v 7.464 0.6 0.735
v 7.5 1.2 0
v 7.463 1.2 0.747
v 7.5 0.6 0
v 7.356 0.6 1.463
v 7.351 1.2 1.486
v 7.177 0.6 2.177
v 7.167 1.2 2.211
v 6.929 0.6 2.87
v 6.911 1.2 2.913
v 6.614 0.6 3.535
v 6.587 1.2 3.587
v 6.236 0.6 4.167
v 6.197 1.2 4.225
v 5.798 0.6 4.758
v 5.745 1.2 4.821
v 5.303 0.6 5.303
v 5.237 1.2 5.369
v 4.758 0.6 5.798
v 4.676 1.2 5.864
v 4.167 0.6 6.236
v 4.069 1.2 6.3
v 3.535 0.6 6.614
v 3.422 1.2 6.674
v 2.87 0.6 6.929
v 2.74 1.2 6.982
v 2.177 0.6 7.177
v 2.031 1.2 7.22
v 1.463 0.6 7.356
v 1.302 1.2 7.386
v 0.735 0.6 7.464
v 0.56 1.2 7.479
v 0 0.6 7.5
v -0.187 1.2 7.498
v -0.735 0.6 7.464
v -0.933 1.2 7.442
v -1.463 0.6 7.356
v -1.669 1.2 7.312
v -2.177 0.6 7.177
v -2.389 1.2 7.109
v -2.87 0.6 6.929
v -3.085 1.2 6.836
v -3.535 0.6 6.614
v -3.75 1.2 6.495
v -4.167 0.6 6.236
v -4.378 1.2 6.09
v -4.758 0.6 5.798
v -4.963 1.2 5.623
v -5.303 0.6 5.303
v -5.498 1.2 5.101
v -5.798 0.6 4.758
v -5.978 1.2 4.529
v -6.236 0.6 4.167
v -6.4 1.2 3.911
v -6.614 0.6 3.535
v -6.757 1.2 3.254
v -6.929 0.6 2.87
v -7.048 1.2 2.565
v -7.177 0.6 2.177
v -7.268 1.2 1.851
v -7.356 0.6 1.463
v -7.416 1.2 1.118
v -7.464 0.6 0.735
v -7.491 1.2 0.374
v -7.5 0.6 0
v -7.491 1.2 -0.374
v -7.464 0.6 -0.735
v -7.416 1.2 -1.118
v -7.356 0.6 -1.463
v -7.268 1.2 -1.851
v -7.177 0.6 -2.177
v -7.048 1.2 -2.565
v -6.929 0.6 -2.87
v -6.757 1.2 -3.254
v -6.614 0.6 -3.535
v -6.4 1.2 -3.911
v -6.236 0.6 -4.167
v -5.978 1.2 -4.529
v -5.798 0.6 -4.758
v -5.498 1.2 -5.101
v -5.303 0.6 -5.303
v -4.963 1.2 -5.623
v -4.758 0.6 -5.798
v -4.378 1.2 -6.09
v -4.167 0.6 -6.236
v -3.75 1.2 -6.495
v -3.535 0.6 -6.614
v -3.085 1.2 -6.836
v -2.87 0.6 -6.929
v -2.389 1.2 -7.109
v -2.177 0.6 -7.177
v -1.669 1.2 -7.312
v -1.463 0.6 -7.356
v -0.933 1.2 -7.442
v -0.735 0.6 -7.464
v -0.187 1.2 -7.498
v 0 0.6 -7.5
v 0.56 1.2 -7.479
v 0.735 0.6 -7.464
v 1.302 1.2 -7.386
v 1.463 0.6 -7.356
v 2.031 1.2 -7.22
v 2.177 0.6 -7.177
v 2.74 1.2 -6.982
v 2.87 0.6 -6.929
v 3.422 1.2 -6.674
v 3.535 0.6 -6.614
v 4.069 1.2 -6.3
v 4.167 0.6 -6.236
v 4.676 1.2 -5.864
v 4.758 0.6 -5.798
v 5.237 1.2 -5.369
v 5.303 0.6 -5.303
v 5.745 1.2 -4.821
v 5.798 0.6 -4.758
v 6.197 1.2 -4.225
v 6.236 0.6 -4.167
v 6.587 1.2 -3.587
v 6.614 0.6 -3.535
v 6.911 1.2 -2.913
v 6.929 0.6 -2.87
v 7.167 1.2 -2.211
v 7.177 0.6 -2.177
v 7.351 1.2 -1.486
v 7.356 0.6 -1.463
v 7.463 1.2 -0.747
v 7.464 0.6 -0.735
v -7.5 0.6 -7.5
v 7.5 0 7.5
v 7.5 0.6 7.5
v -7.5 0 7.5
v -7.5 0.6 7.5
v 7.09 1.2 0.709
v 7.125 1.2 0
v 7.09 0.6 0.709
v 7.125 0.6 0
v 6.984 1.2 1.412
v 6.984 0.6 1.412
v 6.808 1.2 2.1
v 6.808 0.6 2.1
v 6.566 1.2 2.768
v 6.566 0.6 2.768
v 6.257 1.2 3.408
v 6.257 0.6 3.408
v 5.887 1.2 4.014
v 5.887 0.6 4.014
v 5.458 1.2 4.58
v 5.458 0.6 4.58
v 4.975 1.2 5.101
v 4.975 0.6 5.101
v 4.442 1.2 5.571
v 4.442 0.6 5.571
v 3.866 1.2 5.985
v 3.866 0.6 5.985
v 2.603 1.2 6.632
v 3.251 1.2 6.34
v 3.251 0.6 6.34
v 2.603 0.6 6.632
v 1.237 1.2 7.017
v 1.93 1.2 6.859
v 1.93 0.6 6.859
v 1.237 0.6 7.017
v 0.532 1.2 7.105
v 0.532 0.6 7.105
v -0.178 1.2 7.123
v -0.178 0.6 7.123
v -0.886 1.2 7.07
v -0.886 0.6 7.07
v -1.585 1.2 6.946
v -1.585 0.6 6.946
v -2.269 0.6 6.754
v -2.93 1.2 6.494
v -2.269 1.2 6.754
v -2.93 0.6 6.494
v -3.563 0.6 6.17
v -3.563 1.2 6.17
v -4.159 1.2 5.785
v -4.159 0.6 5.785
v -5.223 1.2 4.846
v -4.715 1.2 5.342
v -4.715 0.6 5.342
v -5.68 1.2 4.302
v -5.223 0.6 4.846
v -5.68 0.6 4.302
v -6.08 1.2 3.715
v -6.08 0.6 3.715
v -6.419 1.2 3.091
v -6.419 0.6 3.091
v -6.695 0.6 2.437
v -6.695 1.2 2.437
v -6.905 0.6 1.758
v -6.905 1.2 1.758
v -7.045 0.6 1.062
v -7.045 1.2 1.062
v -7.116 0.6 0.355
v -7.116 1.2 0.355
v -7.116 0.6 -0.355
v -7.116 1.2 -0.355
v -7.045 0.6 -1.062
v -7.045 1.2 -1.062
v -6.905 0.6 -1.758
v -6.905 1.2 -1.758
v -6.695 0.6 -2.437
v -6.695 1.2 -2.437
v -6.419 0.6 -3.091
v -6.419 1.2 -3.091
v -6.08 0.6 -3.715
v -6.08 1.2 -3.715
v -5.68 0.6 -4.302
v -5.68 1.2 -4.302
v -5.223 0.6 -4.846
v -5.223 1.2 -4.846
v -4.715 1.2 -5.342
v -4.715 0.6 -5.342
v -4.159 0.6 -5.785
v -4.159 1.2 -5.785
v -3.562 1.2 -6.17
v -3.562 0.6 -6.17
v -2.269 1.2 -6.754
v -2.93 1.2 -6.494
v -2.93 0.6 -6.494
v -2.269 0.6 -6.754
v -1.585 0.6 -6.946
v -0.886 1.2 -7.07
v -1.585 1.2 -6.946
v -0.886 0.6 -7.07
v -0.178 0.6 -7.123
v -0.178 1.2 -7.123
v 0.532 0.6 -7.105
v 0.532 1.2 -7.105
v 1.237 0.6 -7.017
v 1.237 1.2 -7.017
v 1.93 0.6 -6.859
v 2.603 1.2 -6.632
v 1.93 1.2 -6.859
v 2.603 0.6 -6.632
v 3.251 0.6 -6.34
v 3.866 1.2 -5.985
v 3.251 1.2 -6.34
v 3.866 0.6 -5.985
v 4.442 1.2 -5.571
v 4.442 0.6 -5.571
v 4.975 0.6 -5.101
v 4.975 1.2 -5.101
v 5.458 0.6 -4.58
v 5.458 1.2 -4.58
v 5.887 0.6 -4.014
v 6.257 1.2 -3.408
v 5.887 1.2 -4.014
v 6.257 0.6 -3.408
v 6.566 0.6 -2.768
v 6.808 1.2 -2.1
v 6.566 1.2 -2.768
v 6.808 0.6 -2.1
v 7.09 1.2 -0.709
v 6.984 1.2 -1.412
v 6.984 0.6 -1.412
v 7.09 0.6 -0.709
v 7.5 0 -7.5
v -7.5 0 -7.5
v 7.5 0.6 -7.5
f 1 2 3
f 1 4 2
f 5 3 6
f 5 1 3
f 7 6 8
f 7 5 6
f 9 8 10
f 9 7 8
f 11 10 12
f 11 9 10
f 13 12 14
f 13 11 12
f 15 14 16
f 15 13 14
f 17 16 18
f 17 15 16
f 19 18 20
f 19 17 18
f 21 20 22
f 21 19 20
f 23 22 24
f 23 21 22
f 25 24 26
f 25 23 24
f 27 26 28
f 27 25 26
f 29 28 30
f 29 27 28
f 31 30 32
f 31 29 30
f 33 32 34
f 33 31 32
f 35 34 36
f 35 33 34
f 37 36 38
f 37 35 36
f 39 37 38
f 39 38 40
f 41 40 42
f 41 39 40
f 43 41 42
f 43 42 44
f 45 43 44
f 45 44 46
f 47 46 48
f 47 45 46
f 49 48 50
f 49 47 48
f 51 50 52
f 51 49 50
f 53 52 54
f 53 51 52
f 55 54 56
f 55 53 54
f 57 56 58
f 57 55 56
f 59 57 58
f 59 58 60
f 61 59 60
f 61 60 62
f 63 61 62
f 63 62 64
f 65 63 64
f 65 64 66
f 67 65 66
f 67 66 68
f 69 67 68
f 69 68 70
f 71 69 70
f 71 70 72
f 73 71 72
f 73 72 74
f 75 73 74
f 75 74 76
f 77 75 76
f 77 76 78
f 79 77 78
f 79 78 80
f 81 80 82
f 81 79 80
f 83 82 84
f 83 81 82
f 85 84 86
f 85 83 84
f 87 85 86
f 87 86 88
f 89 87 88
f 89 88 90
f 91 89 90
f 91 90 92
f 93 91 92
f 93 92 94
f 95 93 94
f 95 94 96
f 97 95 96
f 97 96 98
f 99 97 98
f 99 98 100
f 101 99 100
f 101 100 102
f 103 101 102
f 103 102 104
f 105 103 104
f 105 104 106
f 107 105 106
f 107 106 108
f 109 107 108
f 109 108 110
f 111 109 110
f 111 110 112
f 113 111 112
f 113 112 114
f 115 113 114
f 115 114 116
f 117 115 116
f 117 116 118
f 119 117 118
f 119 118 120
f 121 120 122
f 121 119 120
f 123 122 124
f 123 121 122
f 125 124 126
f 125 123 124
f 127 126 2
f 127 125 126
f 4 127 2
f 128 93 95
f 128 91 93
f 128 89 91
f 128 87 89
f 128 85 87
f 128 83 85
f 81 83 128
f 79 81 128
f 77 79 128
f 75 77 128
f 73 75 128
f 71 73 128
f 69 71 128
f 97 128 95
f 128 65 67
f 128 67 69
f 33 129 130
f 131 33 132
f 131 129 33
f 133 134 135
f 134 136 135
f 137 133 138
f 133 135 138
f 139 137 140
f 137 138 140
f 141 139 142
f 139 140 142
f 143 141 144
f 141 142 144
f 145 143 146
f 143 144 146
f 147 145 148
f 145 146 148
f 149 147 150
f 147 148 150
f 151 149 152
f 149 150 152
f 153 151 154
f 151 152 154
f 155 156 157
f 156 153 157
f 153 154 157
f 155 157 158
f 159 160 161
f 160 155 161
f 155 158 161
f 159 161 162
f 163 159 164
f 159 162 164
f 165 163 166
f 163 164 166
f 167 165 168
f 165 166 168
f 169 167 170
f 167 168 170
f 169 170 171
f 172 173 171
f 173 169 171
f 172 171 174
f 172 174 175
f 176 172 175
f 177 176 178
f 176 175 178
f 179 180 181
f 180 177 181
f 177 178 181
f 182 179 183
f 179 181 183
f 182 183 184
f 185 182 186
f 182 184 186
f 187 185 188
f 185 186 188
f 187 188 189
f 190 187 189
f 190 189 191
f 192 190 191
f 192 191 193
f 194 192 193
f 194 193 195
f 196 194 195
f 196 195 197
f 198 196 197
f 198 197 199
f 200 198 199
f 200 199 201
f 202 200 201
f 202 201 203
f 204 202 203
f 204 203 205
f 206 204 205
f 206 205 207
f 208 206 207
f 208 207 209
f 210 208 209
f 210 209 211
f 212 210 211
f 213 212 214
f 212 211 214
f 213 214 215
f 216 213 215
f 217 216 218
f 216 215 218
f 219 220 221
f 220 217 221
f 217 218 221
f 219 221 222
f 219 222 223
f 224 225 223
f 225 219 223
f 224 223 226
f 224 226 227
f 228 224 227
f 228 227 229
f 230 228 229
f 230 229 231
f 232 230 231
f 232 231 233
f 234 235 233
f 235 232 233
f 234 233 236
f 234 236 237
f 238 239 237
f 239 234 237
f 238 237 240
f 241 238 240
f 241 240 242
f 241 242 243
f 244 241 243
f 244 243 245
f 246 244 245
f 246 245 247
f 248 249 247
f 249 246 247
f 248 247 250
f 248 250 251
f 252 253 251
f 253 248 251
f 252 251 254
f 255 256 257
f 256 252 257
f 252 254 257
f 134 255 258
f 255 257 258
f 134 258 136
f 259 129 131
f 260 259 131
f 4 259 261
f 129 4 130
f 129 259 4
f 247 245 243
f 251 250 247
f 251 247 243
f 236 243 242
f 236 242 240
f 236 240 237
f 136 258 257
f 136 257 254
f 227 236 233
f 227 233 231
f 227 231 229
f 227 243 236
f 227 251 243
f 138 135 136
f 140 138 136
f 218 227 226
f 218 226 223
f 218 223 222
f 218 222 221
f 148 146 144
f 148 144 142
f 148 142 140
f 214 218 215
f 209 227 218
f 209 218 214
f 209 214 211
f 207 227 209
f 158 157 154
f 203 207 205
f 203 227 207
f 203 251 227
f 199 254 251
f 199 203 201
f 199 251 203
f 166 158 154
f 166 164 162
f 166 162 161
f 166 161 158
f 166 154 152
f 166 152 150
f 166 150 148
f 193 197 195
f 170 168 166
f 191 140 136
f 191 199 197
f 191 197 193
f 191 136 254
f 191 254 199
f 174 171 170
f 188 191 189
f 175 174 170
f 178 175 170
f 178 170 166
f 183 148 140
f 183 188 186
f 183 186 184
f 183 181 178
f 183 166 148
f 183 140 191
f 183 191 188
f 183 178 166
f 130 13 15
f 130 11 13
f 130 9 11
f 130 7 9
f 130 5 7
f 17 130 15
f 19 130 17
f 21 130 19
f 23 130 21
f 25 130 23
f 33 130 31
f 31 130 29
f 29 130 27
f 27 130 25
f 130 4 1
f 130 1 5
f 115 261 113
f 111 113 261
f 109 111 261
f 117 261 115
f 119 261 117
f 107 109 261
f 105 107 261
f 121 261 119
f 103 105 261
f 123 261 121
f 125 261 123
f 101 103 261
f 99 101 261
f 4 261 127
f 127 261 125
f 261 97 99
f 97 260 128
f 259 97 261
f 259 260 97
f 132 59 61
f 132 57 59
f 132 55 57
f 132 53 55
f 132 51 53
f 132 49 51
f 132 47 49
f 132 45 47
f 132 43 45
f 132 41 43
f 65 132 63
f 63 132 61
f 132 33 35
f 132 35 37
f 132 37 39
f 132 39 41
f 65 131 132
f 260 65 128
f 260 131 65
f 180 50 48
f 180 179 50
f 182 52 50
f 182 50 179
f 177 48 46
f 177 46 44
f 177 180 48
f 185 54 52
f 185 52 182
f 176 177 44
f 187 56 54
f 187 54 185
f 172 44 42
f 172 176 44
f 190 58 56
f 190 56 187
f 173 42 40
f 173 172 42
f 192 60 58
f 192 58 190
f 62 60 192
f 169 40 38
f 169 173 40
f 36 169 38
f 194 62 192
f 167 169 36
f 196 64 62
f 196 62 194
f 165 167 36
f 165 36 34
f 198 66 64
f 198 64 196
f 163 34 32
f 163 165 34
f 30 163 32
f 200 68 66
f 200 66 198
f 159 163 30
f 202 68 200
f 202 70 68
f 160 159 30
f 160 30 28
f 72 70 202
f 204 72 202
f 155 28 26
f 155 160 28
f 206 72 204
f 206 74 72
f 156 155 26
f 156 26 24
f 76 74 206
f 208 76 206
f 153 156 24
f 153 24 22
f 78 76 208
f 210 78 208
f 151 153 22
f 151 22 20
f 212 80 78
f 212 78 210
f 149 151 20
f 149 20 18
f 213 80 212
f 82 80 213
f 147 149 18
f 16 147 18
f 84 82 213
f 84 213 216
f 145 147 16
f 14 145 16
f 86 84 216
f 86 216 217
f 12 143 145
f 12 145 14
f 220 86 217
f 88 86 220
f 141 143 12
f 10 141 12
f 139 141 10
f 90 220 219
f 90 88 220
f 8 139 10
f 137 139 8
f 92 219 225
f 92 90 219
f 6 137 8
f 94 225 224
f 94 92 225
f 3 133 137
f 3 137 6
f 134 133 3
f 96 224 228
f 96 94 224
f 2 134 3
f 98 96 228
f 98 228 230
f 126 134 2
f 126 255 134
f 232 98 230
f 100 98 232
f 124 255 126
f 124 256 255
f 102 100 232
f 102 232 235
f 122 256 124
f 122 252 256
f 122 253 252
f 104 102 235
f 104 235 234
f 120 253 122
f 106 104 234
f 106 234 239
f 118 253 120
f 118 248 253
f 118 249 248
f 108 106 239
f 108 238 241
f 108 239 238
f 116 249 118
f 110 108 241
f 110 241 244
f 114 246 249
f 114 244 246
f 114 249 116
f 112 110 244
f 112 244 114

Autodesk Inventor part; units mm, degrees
ref_plane "YZ Plane" through (0, 0, 0) normal (1, 0, 0) x (0, 1, 0)
ref_plane "XZ Plane" through (0, 0, 0) normal (0, 1, 0) x (-1, 0, 0)
ref_plane "XY Plane" through (0, 0, 0) normal (0, 0, 1) x (1, 0, 0)
sketch "Sketch1" plane through (0, 0, 0) normal (0, 1, 0) x (-1, 0, 0)
  line L0 (7.5, -7.5) -> (-7.5, -7.5)
  line L1 (-7.5, -7.5) -> (-7.5, 7.5)
  line L2 (-7.5, 7.5) -> (7.5, 7.5)
  line L3 (7.5, 7.5) -> (7.5, -7.5)
  line L4 (7.5, -7.5) -> (-7.5, 7.5) construction
  line L5 (-7.5, -7.5) -> (7.5, 7.5) construction
  point P0 (0, 0)
  dimension "d0" = 15
  dimension "d1" = 15
extrude "Extrusion1" add sketch "Sketch1" along normal blind 0.6
sketch "Sketch2" plane through (0, 0.6, 0) normal (0, 1, 0) x (1, 0, 0)
  circle A0 centre (0, 0) radius 7.125
  circle A1 centre (0, 0) radius 7.5
  dimension "d4" = 14.25
  dimension "d5" = 15
extrude "Extrusion2" add sketch "Sketch2" along normal blind 0.6
equation "\"d1\" = d0"
properties part number "dot_antirol"
